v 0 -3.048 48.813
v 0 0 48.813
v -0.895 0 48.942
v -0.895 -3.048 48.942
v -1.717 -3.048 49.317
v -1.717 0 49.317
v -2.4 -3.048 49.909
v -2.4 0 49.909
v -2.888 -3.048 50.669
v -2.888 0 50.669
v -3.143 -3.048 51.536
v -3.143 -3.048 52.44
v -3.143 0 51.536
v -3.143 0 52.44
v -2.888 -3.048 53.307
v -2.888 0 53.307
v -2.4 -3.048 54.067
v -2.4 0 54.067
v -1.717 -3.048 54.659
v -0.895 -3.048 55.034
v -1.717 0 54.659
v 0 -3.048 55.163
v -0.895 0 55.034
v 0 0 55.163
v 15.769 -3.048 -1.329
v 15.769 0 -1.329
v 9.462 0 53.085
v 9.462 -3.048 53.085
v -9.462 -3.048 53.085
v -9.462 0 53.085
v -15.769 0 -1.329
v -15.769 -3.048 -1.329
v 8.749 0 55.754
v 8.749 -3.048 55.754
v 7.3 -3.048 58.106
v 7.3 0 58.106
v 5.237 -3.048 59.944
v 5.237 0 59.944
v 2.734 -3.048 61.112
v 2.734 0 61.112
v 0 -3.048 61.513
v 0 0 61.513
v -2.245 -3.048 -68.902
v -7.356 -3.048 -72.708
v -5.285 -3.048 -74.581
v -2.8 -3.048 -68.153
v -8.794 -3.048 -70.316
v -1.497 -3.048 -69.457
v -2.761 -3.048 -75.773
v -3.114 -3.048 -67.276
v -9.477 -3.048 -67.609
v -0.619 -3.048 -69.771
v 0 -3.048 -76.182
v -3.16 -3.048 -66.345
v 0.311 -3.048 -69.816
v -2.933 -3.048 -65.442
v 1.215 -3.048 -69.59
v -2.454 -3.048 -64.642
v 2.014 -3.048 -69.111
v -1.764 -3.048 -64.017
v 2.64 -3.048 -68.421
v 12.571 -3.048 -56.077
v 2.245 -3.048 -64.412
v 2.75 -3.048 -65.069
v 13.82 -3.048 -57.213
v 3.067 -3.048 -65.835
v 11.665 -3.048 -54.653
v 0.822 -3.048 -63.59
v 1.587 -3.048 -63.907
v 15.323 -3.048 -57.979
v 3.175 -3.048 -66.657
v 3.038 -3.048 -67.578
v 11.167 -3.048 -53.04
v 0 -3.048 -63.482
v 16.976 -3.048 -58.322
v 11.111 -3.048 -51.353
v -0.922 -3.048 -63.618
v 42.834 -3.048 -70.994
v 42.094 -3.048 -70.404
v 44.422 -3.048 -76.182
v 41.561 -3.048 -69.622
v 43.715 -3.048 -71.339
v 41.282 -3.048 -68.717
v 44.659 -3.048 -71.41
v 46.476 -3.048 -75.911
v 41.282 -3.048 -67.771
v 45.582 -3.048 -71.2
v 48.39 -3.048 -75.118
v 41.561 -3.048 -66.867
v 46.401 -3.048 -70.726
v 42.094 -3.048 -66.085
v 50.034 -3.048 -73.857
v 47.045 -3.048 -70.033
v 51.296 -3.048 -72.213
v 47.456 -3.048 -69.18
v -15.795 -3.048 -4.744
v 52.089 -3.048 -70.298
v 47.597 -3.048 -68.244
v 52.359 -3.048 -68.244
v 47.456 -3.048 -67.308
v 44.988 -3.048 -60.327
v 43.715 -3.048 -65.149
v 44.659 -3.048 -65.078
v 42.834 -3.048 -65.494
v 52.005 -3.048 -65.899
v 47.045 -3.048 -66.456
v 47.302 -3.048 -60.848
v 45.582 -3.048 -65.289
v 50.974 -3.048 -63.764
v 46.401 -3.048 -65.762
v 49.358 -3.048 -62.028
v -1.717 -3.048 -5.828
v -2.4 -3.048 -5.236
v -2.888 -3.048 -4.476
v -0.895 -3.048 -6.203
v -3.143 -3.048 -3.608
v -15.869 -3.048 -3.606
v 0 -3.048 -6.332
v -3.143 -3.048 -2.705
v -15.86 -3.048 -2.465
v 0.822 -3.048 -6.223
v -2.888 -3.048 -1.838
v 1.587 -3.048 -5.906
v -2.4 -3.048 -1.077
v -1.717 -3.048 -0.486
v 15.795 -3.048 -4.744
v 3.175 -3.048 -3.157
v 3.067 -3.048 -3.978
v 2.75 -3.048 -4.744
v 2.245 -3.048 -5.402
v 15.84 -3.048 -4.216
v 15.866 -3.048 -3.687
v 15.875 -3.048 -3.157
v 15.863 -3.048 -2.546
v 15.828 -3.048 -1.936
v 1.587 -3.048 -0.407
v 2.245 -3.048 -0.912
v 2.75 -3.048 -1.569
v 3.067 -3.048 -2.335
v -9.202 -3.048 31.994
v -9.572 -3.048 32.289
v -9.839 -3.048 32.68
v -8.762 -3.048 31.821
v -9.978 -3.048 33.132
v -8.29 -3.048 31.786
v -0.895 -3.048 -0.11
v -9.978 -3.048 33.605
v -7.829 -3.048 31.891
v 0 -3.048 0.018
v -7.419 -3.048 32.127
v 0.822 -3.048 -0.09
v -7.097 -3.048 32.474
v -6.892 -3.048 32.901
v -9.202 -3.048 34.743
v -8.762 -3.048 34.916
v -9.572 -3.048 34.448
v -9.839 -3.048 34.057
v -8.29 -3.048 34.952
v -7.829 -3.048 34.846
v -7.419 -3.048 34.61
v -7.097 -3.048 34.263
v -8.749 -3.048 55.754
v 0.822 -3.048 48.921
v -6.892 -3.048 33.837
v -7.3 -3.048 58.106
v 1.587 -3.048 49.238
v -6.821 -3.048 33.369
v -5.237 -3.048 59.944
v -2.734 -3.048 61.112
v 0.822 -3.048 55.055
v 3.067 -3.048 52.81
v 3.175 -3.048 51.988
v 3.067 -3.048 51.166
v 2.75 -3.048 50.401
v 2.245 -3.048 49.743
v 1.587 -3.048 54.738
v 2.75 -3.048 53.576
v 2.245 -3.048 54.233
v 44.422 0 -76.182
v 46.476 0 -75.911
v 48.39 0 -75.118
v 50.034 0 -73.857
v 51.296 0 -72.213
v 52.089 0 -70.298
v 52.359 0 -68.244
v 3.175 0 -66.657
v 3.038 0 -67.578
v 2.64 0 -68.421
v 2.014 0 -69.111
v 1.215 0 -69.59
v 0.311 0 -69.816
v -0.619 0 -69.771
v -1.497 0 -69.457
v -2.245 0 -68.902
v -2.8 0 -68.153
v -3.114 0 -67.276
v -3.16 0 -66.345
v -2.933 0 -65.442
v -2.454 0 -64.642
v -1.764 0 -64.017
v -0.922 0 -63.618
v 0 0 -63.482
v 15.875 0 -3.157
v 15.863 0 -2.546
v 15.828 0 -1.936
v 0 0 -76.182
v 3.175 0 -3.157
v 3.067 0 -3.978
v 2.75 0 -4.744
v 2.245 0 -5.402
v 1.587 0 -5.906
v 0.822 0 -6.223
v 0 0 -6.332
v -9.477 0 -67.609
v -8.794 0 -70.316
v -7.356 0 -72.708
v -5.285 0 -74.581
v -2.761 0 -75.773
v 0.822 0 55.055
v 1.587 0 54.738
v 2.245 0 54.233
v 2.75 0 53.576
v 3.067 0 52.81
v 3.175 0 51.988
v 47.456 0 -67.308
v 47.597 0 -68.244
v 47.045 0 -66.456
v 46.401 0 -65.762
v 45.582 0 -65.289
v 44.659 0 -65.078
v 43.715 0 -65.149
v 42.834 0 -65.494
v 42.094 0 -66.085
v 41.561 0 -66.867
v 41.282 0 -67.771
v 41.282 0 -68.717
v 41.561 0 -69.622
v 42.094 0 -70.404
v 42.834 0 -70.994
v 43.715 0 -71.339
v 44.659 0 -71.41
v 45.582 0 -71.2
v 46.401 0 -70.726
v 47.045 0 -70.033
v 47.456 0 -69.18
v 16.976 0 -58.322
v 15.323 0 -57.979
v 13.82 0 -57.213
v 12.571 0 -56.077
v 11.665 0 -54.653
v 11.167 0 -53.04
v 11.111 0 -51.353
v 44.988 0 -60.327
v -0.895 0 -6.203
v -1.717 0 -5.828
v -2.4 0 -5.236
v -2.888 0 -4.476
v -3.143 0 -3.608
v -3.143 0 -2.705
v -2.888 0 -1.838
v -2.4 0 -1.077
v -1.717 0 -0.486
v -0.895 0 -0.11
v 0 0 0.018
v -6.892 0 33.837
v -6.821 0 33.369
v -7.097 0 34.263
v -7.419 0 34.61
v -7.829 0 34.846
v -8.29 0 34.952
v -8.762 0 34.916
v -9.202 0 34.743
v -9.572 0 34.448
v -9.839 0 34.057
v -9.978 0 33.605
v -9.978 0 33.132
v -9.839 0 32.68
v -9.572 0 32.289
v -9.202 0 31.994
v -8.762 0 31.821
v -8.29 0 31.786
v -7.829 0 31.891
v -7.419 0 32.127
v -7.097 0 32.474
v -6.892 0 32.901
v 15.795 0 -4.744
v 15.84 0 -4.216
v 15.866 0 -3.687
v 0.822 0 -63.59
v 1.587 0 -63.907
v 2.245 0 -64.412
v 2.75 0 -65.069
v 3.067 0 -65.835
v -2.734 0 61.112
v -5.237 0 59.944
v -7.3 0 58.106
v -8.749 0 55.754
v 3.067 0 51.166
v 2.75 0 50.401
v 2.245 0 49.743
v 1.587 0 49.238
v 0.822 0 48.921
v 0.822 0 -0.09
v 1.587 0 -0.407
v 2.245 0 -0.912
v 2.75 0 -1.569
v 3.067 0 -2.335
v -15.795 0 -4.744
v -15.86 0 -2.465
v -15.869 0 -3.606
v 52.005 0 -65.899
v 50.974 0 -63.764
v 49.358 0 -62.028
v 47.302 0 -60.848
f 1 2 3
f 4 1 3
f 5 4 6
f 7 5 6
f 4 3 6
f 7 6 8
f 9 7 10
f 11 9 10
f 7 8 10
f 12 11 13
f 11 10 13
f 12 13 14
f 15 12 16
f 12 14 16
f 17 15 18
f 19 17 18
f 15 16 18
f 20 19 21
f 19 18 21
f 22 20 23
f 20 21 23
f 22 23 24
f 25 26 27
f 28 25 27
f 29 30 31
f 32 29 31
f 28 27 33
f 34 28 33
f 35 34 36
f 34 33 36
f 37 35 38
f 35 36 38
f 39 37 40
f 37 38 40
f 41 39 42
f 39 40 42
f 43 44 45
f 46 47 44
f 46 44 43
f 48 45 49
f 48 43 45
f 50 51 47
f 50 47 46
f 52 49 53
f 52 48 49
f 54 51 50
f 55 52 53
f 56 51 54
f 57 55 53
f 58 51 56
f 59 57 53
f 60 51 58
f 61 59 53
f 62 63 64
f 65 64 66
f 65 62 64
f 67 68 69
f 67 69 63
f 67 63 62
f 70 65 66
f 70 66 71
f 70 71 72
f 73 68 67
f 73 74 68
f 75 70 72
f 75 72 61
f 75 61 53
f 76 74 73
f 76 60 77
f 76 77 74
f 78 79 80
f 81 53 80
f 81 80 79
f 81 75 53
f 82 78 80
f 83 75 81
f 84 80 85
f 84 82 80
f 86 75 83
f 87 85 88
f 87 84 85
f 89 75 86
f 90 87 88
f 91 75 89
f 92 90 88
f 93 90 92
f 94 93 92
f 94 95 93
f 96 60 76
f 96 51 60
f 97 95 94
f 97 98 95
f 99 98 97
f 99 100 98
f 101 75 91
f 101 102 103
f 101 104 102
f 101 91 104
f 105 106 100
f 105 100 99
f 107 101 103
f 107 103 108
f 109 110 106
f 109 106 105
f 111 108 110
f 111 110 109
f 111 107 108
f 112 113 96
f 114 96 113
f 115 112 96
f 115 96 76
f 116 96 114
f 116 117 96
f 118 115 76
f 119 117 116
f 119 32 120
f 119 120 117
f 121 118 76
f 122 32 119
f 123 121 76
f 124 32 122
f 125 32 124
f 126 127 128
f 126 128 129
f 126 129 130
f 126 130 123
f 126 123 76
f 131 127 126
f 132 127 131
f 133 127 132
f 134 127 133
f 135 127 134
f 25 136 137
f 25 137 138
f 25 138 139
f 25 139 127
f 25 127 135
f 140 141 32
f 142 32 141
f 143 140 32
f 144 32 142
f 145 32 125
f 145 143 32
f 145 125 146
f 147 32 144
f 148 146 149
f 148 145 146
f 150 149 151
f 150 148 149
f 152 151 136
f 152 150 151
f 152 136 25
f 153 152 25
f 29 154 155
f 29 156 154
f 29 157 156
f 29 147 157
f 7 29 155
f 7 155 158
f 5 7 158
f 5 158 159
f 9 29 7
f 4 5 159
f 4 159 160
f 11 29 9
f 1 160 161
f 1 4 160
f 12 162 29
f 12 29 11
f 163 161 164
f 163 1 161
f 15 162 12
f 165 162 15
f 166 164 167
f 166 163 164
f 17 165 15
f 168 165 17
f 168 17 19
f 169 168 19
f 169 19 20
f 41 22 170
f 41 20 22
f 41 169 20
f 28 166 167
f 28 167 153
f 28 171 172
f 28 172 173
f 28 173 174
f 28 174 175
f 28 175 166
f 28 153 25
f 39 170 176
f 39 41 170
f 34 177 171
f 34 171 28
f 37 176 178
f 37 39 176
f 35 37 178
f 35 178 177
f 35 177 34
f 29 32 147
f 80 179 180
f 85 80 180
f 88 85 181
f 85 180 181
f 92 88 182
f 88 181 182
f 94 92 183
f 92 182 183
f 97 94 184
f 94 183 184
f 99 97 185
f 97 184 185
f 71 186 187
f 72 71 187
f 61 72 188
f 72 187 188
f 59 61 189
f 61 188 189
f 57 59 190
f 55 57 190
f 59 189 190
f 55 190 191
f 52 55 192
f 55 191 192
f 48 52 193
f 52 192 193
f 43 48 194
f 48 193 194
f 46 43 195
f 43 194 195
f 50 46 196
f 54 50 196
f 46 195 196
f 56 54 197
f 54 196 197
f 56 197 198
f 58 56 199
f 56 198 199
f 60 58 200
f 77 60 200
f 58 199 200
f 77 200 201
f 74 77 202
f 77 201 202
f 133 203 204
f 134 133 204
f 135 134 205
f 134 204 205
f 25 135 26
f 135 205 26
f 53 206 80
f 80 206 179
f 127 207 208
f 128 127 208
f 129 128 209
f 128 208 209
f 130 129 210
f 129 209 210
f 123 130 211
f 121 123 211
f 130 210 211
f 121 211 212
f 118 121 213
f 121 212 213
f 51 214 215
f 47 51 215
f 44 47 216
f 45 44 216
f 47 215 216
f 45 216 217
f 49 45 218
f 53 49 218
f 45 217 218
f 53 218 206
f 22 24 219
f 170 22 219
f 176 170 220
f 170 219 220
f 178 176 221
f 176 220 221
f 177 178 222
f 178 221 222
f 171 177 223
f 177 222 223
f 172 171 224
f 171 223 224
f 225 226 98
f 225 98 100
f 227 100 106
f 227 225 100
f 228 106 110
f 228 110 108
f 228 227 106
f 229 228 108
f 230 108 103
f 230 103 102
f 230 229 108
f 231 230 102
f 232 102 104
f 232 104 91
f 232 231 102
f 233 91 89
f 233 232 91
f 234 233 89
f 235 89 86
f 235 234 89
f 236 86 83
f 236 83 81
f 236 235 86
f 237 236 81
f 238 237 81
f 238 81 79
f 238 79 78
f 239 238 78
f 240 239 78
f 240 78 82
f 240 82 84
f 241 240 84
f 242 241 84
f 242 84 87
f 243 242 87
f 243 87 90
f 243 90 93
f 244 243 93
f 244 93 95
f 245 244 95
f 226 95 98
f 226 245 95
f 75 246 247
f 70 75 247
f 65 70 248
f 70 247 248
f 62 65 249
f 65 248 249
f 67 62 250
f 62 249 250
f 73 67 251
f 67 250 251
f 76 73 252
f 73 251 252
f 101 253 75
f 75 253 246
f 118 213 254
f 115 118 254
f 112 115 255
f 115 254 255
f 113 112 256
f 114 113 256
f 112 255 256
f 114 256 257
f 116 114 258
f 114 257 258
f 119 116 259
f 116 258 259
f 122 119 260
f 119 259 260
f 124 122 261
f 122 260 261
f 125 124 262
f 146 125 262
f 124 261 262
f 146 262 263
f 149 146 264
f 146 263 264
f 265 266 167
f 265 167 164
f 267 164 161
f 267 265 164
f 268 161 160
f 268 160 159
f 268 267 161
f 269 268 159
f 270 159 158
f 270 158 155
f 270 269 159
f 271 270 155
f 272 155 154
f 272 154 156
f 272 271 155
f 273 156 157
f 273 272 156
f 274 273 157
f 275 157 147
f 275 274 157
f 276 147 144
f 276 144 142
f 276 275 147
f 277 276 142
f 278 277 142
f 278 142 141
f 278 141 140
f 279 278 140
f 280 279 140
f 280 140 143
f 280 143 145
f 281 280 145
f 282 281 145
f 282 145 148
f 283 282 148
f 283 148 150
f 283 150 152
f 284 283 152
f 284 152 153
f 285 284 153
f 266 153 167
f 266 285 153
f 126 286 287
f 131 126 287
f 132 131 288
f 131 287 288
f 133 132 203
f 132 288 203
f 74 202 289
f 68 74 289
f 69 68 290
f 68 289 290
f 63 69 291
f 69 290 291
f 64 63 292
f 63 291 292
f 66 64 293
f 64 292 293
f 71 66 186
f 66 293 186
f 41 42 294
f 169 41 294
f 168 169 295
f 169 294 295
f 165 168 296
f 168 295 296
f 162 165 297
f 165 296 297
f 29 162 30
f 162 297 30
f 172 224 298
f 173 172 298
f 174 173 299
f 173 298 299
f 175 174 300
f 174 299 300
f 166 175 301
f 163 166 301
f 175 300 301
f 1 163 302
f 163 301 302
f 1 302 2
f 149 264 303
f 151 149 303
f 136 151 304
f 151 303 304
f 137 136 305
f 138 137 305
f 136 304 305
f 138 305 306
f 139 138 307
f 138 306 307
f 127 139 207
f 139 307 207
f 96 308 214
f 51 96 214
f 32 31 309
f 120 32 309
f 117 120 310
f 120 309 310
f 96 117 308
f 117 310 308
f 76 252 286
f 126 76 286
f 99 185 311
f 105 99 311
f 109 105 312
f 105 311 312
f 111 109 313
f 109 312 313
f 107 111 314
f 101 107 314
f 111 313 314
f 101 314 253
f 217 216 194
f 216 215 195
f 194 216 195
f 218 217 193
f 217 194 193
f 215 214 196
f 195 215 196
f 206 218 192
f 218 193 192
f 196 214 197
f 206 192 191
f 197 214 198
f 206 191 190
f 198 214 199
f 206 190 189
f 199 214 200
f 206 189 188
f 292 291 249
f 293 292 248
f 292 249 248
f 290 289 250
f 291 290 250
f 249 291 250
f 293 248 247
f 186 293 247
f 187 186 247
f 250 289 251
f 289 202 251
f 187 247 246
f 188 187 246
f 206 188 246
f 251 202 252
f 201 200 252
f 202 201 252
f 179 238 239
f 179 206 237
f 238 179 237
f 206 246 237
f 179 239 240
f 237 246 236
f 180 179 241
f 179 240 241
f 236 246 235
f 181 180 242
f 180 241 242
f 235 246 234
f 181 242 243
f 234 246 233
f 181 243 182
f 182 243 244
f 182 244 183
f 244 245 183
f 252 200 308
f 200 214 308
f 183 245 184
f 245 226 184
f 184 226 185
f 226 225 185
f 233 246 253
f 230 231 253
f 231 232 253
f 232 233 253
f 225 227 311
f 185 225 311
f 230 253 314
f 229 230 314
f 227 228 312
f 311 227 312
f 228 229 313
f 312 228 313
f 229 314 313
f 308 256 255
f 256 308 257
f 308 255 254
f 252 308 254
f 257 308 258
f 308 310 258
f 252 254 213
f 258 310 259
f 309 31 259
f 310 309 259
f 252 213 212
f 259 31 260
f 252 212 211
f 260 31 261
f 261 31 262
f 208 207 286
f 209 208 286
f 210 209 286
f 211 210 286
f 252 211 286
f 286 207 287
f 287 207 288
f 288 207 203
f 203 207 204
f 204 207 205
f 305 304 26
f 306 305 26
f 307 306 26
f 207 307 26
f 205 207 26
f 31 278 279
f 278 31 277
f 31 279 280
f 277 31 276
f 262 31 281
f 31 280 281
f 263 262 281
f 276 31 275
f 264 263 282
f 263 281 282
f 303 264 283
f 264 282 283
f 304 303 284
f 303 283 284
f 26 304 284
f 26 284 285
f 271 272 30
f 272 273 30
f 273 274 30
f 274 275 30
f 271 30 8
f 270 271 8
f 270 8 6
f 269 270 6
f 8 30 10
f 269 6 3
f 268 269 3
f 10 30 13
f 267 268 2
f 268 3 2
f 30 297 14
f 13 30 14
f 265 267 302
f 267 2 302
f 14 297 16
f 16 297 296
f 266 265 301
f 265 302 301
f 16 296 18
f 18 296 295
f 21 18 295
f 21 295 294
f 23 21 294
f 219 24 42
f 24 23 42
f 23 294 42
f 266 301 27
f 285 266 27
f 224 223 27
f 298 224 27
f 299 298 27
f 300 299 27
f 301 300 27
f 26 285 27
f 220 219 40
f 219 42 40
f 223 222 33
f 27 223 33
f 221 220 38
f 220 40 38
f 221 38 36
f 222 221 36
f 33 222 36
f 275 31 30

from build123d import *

# Parameters (mm, degrees)
F0_R     = 1.5875
F0_R_2   = 3.175
F1_DEPTH = 3.048


with BuildPart() as f1:
    # F0 (on Front) → F1 (new body)
    with BuildSketch(Plane.XZ):
        with BuildLine():
            ThreePointArc((0, 55.163064), (2.245064, 54.233128), (3.175, 51.988064))
            ThreePointArc((3.175, 51.988064), (2.245064, 49.743), (0, 48.813064))
            Line((0, 48.813064), (0, 42.463064))
            ThreePointArc((0, 42.463064), (6.735192, 45.252872), (9.525, 51.988064))
            ThreePointArc((9.525, 51.988064), (9.509147, 52.537388), (9.461639, 53.084883))
            ThreePointArc((9.461639, 53.084883), (6.335551, 59.100477), (0, 61.513064))
            Line((0, 61.513064), (0, 55.163064))
        make_face()
        with BuildLine():
            ThreePointArc((0, 48.813064), (-3.175, 51.988064), (0, 55.163064))
            Line((0, 55.163064), (0, 61.513064))
            ThreePointArc((0, 61.513064), (-6.335551, 59.100477), (-9.461639, 53.084883))
            ThreePointArc((-9.461639, 53.084883), (-7.112413, 45.652513), (0, 42.463064))
            Line((0, 42.463064), (0, 48.813064))
        make_face()
        with BuildLine():
            Line((0, 12.718398), (0, 42.463064))
            ThreePointArc((0, 42.463064), (-7.112413, 45.652513), (-9.461639, 53.084883))
            Line((-9.461639, 53.084883), (-15.769398, -1.32857))
            ThreePointArc((-15.769398, -1.32857), (-10.559252, 8.697419), (0, 12.718398))
        make_face()
        with Locations((-8.408644, 33.368598)):
            Circle(F0_R, mode=Mode.SUBTRACT)
        with BuildLine():
            ThreePointArc((9.525, 51.988064), (6.735192, 45.252872), (0, 42.463064))
            Line((0, 42.463064), (0, 12.718398))
            ThreePointArc((0, 12.718398), (10.559252, 8.697419), (15.769398, -1.32857))
            Line((15.769398, -1.32857), (9.461639, 53.084883))
            ThreePointArc((9.461639, 53.084883), (9.509147, 52.537388), (9.525, 51.988064))
        make_face()
        with BuildLine():
            Line((0, 0.018398), (0, 12.718398))
            ThreePointArc((0, 12.718398), (-10.559252, 8.697419), (-15.769398, -1.32857))
            ThreePointArc((-15.769398, -1.32857), (-15.874539, -3.035634), (-15.795426, -4.744102))
            ThreePointArc((-15.795426, -4.744102), (-10.649274, -14.929817), (0, -19.031602))
            Line((0, -19.031602), (0, -6.331602))
            ThreePointArc((0, -6.331602), (-3.175, -3.156602), (0, 0.018398))
        make_face()
        with BuildLine():
            ThreePointArc((15.769398, -1.32857), (10.559252, 8.697419), (0, 12.718398))
            Line((0, 12.718398), (0, 0.018398))
            ThreePointArc((0, 0.018398), (2.245064, -0.911538), (3.175, -3.156602))
            ThreePointArc((3.175, -3.156602), (2.245064, -5.401666), (0, -6.331602))
            Line((0, -6.331602), (0, -19.031602))
            ThreePointArc((0, -19.031602), (10.649274, -14.929817), (15.795426, -4.744102))
            ThreePointArc((15.795426, -4.744102), (15.855094, -3.951349), (15.875, -3.156602))
            ThreePointArc((15.875, -3.156602), (15.848578, -2.241062), (15.769398, -1.32857))
        make_face()
        with BuildLine():
            ThreePointArc((0, -19.031602), (-10.649274, -14.929817), (-15.795426, -4.744102))
            Line((-15.795426, -4.744102), (-9.477255, -67.609102))
            ThreePointArc((-9.477255, -67.609102), (-7.063929, -60.267038), (0, -57.131602))
            Line((0, -57.131602), (0, -19.031602))
        make_face()
        with BuildLine():
            Line((11.111022, -51.353331), (15.795426, -4.744102))
            ThreePointArc((15.795426, -4.744102), (10.649274, -14.929817), (0, -19.031602))
            Line((0, -19.031602), (0, -57.131602))
            ThreePointArc((0, -57.131602), (6.735192, -59.92141), (9.525, -66.656602))
            ThreePointArc((9.525, -66.656602), (6.735192, -73.391794), (0, -76.181602))
            Line((0, -76.181602), (44.421643, -76.181602))
            ThreePointArc((44.421643, -76.181602), (36.489207, -67.96062), (44.988245, -60.326851))
            Line((44.988245, -60.326851), (16.97591, -58.322132))
            ThreePointArc((16.97591, -58.322132), (12.570778, -56.077134), (11.111022, -51.353331))
        make_face()
        with BuildLine():
            ThreePointArc((3.175, -66.656602), (2.245064, -64.411538), (0, -63.481602))
            ThreePointArc((0, -63.481602), (-2.245064, -68.901666), (3.175, -66.656602))
        make_face()
        with BuildLine():
            ThreePointArc((0, -57.131602), (-7.063929, -60.267038), (-9.477255, -67.609102))
            ThreePointArc((-9.477255, -67.609102), (-6.389564, -73.720531), (0, -76.181602))
            ThreePointArc((0, -76.181602), (6.735192, -73.391794), (9.525, -66.656602))
            ThreePointArc((9.525, -66.656602), (6.735192, -59.92141), (0, -57.131602))
        make_face()
        with BuildLine():
            ThreePointArc((3.175, -66.656602), (-2.245064, -68.901666), (0, -63.481602))
            ThreePointArc((0, -63.481602), (2.245064, -64.411538), (3.175, -66.656602))
        make_face(mode=Mode.SUBTRACT)
        with BuildLine():
            ThreePointArc((44.988245, -60.326851), (36.489207, -67.96062), (44.421643, -76.181602))
            ThreePointArc((44.421643, -76.181602), (50.034303, -73.856762), (52.359143, -68.244102))
            ThreePointArc((52.359143, -68.244102), (50.231174, -62.835475), (44.988245, -60.326851))
        make_face()
        with Locations((44.421643, -68.244102)):
            Circle(F0_R_2, mode=Mode.SUBTRACT)
    extrude(amount=F1_DEPTH)


solid = f1.part
